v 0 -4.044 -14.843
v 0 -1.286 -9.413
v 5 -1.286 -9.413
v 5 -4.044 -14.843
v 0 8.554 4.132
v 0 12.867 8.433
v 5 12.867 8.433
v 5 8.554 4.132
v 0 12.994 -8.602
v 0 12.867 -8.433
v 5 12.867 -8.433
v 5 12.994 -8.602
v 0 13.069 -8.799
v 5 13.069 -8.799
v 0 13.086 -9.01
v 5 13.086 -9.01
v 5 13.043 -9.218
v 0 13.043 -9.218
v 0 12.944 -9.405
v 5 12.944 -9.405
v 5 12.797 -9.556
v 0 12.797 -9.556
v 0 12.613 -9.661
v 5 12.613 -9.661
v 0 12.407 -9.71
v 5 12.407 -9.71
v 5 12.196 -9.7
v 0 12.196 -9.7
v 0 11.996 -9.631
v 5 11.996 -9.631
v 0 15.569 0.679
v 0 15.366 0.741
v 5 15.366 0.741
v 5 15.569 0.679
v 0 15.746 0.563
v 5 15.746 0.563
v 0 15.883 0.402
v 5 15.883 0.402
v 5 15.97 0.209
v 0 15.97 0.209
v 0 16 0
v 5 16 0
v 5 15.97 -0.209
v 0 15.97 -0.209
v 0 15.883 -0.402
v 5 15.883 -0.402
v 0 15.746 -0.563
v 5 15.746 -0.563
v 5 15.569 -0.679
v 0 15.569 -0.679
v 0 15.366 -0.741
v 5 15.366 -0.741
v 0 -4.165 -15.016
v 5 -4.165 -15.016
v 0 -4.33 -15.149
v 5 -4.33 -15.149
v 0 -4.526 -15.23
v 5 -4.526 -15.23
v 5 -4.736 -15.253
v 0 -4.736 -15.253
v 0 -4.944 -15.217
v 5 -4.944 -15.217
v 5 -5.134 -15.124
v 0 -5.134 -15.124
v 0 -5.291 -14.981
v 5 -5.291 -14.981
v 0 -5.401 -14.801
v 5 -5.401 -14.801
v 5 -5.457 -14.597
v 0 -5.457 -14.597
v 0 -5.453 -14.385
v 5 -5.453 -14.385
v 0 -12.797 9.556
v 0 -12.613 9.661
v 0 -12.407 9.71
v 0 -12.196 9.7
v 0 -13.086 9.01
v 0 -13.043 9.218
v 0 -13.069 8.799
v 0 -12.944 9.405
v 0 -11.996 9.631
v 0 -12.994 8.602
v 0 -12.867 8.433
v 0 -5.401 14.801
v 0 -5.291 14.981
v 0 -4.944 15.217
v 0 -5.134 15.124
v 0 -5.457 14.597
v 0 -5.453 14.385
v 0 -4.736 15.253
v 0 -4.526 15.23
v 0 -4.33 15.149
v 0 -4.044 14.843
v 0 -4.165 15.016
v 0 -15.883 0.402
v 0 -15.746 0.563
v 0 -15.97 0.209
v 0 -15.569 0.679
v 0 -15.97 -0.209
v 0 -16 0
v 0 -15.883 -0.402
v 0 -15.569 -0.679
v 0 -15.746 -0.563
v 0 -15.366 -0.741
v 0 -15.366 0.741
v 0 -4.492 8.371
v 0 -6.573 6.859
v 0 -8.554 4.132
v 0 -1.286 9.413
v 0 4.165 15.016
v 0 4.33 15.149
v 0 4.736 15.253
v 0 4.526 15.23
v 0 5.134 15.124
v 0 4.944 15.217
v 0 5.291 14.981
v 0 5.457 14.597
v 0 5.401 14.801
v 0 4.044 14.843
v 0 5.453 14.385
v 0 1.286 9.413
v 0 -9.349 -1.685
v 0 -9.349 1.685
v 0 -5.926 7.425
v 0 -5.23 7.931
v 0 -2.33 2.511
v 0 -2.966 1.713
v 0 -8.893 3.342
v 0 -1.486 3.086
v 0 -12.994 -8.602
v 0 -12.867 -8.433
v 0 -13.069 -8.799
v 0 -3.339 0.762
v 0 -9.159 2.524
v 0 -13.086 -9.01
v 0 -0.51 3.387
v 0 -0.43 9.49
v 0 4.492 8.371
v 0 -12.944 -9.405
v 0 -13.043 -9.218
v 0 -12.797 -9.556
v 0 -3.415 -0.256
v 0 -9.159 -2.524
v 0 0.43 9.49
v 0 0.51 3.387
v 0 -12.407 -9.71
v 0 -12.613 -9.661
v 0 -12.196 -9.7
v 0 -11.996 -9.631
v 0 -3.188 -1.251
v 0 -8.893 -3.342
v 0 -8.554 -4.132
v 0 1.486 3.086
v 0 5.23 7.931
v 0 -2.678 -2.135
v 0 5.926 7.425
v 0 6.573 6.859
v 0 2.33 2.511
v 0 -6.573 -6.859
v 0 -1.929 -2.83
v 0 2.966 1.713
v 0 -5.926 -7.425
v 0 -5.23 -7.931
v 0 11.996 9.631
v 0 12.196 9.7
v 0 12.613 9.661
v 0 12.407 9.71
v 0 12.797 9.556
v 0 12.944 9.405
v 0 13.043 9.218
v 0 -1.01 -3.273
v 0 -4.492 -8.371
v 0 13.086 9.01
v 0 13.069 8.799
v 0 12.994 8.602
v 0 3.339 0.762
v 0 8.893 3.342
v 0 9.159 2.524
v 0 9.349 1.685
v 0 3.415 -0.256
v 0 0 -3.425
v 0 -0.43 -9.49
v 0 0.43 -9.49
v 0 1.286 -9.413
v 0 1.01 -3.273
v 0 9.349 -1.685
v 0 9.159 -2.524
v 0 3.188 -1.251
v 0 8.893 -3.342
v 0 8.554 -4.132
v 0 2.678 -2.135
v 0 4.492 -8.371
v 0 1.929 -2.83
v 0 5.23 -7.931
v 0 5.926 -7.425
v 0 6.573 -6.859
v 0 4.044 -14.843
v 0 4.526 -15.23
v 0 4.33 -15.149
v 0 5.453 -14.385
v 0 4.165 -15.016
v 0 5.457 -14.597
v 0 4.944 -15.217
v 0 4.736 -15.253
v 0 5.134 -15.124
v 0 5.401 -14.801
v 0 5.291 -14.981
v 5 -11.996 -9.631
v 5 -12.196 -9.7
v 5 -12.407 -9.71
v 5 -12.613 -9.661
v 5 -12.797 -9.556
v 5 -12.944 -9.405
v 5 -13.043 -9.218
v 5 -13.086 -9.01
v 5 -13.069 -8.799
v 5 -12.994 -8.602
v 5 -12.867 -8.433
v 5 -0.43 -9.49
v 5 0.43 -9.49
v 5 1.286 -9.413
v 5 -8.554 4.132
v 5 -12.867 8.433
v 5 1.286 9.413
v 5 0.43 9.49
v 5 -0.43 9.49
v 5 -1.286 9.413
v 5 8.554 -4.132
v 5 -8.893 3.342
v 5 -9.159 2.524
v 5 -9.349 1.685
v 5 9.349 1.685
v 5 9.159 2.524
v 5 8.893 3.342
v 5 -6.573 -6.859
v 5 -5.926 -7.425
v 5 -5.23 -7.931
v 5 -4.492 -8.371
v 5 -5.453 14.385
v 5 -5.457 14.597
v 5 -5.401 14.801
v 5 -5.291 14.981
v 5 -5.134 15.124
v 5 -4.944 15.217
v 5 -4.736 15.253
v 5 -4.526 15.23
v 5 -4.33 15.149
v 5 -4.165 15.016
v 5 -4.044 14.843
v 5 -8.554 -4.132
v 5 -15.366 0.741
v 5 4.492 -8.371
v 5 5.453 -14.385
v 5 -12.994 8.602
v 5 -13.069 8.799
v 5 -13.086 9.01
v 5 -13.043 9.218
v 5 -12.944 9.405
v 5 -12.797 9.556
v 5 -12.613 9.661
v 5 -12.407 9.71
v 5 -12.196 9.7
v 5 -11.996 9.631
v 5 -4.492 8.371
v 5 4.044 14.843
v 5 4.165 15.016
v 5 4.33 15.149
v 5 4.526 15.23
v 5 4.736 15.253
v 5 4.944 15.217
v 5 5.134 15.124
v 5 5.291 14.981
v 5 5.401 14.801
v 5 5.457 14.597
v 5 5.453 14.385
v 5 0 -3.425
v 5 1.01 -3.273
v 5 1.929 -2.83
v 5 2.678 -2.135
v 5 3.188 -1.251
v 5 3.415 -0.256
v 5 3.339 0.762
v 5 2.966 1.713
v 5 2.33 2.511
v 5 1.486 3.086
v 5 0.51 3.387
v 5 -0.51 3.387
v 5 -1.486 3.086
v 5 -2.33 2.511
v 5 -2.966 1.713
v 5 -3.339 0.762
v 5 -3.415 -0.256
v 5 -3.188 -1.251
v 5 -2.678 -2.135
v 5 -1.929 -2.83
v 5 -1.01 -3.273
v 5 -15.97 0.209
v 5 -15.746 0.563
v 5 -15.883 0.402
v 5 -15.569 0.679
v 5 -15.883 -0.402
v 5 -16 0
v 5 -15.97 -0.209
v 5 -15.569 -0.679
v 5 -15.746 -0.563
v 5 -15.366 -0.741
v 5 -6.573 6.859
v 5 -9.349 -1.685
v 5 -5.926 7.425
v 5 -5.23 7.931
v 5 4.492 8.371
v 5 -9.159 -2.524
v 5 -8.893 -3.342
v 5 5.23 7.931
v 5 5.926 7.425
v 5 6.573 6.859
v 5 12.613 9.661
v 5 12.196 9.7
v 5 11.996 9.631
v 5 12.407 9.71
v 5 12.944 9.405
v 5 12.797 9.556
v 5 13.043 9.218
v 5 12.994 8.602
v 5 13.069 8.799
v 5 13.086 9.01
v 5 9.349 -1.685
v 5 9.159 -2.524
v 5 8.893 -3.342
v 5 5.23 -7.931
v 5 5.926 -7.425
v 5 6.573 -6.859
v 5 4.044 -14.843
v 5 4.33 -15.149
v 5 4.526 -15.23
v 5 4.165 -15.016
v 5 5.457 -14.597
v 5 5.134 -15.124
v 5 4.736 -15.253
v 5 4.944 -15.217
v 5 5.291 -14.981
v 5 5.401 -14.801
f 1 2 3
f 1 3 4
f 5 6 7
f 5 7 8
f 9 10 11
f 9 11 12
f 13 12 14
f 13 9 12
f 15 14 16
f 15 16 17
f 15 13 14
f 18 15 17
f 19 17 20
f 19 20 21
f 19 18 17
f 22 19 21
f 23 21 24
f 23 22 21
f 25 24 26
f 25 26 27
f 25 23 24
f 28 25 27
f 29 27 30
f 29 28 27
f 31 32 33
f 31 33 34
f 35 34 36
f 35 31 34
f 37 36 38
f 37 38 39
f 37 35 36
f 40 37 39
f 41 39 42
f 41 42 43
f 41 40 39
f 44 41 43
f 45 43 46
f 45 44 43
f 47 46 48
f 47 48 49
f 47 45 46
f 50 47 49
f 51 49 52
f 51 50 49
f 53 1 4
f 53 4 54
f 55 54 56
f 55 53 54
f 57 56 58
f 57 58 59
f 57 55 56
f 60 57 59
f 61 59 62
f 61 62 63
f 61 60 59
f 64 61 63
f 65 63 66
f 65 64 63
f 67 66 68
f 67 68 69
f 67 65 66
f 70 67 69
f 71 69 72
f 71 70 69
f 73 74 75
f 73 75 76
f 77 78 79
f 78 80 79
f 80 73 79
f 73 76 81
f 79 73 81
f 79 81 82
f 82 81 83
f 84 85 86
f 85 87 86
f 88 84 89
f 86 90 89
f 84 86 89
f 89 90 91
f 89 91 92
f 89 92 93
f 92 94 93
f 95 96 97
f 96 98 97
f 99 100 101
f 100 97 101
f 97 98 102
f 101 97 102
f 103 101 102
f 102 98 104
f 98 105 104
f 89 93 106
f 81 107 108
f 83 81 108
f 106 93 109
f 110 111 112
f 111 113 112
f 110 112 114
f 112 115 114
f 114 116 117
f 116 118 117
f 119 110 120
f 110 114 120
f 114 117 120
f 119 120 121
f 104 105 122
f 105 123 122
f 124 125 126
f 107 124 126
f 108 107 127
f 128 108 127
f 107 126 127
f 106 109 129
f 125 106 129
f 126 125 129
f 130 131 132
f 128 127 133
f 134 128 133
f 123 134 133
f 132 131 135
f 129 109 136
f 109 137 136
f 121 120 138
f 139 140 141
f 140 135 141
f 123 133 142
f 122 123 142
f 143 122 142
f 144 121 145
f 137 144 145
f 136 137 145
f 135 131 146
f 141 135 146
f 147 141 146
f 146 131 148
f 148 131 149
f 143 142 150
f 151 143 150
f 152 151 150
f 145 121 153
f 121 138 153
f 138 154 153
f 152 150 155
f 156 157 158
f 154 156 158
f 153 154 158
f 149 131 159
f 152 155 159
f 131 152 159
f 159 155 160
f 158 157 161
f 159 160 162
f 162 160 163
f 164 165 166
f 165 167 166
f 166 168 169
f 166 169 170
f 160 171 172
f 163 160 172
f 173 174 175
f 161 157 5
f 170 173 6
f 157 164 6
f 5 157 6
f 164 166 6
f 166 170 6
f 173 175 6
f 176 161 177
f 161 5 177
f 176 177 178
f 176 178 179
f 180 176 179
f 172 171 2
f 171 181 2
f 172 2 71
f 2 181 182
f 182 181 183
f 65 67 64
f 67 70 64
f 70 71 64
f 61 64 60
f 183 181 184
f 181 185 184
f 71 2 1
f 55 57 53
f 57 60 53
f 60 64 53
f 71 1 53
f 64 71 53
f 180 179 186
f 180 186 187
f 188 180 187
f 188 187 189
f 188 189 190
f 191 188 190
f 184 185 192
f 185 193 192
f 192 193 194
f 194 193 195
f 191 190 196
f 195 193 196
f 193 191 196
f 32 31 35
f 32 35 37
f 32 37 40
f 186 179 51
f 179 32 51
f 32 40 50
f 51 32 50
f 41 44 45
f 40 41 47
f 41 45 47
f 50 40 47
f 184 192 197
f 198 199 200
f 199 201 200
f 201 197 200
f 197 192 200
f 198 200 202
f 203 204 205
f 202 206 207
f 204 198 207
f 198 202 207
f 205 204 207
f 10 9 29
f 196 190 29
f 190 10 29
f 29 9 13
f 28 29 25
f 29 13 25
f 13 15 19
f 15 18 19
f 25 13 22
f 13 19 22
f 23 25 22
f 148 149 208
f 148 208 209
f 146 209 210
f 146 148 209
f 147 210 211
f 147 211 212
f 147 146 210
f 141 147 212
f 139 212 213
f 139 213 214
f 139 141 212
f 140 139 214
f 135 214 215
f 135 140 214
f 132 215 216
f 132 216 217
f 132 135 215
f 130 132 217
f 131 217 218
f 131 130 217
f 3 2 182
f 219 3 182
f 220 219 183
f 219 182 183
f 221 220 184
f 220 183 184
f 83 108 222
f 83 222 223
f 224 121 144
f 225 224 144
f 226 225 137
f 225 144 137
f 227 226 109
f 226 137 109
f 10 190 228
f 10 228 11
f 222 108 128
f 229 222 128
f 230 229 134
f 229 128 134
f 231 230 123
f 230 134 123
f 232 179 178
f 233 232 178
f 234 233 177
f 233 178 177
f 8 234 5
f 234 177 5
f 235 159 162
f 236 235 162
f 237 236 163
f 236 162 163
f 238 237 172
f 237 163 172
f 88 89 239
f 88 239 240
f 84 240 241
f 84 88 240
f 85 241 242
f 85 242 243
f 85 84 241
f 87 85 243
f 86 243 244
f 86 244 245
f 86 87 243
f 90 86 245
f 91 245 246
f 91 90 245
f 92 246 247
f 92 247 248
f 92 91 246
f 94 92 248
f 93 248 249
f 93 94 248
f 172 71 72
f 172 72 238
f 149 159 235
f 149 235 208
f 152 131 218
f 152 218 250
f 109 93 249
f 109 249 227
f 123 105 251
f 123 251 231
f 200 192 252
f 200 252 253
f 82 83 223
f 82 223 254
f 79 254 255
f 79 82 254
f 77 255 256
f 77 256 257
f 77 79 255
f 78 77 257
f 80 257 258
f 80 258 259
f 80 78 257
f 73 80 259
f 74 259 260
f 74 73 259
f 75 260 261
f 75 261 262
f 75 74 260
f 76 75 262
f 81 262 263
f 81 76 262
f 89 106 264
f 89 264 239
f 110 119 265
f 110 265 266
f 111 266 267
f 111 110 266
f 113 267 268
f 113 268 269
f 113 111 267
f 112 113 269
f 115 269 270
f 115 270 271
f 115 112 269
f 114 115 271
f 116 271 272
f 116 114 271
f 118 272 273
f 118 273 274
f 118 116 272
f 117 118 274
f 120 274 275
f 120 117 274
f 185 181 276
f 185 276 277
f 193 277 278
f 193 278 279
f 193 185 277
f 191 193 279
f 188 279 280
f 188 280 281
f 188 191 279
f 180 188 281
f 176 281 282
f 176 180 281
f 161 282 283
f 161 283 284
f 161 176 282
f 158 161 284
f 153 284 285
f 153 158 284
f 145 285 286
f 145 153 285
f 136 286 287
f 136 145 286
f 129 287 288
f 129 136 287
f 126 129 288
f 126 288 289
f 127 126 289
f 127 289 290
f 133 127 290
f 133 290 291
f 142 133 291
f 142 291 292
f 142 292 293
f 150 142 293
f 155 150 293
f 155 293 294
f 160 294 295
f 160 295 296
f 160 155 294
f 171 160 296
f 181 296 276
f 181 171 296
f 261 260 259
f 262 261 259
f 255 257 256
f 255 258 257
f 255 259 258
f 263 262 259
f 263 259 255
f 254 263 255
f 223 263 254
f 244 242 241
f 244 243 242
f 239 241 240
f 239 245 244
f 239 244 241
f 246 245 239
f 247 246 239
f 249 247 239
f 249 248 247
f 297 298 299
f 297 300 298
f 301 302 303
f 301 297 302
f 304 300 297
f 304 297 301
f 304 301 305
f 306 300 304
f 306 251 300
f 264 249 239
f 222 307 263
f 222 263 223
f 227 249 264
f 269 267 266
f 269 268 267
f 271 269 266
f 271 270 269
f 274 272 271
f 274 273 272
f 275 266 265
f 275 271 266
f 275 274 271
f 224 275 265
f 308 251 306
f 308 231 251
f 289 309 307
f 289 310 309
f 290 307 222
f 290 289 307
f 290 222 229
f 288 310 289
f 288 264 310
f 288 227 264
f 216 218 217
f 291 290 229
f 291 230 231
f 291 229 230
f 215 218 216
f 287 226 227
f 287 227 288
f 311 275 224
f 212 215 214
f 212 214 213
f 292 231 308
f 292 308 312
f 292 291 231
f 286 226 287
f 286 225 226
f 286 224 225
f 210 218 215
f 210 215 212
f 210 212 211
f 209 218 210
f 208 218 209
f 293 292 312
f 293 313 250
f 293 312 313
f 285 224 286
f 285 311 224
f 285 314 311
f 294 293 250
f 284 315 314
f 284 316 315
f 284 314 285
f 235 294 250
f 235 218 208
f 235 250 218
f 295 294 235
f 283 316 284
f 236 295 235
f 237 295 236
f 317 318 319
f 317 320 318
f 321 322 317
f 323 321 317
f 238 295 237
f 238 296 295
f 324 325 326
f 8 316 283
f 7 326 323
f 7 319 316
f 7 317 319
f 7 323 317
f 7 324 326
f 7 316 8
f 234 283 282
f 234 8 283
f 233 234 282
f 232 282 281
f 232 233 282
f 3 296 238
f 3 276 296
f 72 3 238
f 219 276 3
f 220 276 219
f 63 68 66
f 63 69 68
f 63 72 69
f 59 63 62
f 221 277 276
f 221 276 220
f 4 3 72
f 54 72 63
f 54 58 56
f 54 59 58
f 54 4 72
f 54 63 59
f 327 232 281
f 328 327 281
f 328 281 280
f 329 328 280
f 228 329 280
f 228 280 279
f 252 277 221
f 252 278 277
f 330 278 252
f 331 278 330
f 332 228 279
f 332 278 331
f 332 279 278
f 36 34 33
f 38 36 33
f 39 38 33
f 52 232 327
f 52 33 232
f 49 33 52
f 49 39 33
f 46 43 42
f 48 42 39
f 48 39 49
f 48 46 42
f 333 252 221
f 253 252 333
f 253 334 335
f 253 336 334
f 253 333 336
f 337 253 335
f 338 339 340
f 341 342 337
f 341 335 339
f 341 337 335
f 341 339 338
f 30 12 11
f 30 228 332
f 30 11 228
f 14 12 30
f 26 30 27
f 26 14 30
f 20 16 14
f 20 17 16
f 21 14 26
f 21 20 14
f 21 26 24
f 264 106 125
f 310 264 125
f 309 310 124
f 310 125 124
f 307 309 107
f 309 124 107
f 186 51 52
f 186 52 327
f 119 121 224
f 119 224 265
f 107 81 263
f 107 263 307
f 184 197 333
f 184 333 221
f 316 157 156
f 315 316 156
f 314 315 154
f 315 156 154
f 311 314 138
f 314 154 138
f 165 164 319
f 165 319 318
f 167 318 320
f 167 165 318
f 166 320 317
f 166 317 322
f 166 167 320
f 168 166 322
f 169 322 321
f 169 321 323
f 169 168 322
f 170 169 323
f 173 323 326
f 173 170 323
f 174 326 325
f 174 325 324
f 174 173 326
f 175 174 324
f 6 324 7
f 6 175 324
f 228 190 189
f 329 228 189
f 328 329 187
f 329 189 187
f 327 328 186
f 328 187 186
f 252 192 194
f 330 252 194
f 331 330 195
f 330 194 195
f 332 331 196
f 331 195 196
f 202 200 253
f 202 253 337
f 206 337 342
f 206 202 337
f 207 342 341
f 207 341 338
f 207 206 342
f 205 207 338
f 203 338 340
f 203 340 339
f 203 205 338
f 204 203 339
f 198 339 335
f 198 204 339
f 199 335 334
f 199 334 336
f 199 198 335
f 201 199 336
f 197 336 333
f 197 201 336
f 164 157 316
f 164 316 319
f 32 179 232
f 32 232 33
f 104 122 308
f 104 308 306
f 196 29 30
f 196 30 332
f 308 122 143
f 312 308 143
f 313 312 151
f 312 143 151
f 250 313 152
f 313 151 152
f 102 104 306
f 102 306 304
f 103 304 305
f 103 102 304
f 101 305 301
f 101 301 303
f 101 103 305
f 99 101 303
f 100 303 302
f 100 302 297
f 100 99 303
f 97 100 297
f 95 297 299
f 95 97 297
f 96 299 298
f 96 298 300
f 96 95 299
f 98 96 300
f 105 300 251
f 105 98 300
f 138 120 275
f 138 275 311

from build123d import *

# Parameters (mm, degrees)
SKETCH2_R           = 9.5
SKETCH2_R_2         = 3.425
BOSS_EXTRUDE3_DEPTH = 5
BOSS_EXTRUDE5_DEPTH = 5
CIRPATTERN1_COUNT   = 10


with BuildPart() as part:
    # Sketch2 → Boss-Extrude3 (new body)
    with BuildSketch(Plane(origin=(0, 0, 0), x_dir=(0, 0, -1), z_dir=(1, 0, 0))):
        Circle(SKETCH2_R)
        Circle(SKETCH2_R_2, mode=Mode.SUBTRACT)
    extrude(amount=BOSS_EXTRUDE3_DEPTH)

    # Sketch4 → Boss-Extrude5 (add)
    with BuildSketch(Plane.ZY):
        with BuildLine():
            Line((-0.740931013, 15.366280839), (-1.685223767, 9.349332642))
            ThreePointArc((-1.685223767, 9.349332642), (0, 9.5), (1.685223767, 9.349332642))
            Line((1.685223767, 9.349332642), (0.740931013, 15.366280839))
            ThreePointArc((0.740931013, 15.366280839), (0, 16), (-0.740931013, 15.366280839))
        make_face()
    boss_extrude5 = extrude(amount=-BOSS_EXTRUDE5_DEPTH)

    # CirPattern1: Boss-Extrude5 ×10 about axis
    cirpattern1_axis = Axis((0, 0, 0), (1, 0, 0))
    for i in range(1, CIRPATTERN1_COUNT):
        add(boss_extrude5.rotate(cirpattern1_axis, i * 360 / CIRPATTERN1_COUNT))


solid = part.part
